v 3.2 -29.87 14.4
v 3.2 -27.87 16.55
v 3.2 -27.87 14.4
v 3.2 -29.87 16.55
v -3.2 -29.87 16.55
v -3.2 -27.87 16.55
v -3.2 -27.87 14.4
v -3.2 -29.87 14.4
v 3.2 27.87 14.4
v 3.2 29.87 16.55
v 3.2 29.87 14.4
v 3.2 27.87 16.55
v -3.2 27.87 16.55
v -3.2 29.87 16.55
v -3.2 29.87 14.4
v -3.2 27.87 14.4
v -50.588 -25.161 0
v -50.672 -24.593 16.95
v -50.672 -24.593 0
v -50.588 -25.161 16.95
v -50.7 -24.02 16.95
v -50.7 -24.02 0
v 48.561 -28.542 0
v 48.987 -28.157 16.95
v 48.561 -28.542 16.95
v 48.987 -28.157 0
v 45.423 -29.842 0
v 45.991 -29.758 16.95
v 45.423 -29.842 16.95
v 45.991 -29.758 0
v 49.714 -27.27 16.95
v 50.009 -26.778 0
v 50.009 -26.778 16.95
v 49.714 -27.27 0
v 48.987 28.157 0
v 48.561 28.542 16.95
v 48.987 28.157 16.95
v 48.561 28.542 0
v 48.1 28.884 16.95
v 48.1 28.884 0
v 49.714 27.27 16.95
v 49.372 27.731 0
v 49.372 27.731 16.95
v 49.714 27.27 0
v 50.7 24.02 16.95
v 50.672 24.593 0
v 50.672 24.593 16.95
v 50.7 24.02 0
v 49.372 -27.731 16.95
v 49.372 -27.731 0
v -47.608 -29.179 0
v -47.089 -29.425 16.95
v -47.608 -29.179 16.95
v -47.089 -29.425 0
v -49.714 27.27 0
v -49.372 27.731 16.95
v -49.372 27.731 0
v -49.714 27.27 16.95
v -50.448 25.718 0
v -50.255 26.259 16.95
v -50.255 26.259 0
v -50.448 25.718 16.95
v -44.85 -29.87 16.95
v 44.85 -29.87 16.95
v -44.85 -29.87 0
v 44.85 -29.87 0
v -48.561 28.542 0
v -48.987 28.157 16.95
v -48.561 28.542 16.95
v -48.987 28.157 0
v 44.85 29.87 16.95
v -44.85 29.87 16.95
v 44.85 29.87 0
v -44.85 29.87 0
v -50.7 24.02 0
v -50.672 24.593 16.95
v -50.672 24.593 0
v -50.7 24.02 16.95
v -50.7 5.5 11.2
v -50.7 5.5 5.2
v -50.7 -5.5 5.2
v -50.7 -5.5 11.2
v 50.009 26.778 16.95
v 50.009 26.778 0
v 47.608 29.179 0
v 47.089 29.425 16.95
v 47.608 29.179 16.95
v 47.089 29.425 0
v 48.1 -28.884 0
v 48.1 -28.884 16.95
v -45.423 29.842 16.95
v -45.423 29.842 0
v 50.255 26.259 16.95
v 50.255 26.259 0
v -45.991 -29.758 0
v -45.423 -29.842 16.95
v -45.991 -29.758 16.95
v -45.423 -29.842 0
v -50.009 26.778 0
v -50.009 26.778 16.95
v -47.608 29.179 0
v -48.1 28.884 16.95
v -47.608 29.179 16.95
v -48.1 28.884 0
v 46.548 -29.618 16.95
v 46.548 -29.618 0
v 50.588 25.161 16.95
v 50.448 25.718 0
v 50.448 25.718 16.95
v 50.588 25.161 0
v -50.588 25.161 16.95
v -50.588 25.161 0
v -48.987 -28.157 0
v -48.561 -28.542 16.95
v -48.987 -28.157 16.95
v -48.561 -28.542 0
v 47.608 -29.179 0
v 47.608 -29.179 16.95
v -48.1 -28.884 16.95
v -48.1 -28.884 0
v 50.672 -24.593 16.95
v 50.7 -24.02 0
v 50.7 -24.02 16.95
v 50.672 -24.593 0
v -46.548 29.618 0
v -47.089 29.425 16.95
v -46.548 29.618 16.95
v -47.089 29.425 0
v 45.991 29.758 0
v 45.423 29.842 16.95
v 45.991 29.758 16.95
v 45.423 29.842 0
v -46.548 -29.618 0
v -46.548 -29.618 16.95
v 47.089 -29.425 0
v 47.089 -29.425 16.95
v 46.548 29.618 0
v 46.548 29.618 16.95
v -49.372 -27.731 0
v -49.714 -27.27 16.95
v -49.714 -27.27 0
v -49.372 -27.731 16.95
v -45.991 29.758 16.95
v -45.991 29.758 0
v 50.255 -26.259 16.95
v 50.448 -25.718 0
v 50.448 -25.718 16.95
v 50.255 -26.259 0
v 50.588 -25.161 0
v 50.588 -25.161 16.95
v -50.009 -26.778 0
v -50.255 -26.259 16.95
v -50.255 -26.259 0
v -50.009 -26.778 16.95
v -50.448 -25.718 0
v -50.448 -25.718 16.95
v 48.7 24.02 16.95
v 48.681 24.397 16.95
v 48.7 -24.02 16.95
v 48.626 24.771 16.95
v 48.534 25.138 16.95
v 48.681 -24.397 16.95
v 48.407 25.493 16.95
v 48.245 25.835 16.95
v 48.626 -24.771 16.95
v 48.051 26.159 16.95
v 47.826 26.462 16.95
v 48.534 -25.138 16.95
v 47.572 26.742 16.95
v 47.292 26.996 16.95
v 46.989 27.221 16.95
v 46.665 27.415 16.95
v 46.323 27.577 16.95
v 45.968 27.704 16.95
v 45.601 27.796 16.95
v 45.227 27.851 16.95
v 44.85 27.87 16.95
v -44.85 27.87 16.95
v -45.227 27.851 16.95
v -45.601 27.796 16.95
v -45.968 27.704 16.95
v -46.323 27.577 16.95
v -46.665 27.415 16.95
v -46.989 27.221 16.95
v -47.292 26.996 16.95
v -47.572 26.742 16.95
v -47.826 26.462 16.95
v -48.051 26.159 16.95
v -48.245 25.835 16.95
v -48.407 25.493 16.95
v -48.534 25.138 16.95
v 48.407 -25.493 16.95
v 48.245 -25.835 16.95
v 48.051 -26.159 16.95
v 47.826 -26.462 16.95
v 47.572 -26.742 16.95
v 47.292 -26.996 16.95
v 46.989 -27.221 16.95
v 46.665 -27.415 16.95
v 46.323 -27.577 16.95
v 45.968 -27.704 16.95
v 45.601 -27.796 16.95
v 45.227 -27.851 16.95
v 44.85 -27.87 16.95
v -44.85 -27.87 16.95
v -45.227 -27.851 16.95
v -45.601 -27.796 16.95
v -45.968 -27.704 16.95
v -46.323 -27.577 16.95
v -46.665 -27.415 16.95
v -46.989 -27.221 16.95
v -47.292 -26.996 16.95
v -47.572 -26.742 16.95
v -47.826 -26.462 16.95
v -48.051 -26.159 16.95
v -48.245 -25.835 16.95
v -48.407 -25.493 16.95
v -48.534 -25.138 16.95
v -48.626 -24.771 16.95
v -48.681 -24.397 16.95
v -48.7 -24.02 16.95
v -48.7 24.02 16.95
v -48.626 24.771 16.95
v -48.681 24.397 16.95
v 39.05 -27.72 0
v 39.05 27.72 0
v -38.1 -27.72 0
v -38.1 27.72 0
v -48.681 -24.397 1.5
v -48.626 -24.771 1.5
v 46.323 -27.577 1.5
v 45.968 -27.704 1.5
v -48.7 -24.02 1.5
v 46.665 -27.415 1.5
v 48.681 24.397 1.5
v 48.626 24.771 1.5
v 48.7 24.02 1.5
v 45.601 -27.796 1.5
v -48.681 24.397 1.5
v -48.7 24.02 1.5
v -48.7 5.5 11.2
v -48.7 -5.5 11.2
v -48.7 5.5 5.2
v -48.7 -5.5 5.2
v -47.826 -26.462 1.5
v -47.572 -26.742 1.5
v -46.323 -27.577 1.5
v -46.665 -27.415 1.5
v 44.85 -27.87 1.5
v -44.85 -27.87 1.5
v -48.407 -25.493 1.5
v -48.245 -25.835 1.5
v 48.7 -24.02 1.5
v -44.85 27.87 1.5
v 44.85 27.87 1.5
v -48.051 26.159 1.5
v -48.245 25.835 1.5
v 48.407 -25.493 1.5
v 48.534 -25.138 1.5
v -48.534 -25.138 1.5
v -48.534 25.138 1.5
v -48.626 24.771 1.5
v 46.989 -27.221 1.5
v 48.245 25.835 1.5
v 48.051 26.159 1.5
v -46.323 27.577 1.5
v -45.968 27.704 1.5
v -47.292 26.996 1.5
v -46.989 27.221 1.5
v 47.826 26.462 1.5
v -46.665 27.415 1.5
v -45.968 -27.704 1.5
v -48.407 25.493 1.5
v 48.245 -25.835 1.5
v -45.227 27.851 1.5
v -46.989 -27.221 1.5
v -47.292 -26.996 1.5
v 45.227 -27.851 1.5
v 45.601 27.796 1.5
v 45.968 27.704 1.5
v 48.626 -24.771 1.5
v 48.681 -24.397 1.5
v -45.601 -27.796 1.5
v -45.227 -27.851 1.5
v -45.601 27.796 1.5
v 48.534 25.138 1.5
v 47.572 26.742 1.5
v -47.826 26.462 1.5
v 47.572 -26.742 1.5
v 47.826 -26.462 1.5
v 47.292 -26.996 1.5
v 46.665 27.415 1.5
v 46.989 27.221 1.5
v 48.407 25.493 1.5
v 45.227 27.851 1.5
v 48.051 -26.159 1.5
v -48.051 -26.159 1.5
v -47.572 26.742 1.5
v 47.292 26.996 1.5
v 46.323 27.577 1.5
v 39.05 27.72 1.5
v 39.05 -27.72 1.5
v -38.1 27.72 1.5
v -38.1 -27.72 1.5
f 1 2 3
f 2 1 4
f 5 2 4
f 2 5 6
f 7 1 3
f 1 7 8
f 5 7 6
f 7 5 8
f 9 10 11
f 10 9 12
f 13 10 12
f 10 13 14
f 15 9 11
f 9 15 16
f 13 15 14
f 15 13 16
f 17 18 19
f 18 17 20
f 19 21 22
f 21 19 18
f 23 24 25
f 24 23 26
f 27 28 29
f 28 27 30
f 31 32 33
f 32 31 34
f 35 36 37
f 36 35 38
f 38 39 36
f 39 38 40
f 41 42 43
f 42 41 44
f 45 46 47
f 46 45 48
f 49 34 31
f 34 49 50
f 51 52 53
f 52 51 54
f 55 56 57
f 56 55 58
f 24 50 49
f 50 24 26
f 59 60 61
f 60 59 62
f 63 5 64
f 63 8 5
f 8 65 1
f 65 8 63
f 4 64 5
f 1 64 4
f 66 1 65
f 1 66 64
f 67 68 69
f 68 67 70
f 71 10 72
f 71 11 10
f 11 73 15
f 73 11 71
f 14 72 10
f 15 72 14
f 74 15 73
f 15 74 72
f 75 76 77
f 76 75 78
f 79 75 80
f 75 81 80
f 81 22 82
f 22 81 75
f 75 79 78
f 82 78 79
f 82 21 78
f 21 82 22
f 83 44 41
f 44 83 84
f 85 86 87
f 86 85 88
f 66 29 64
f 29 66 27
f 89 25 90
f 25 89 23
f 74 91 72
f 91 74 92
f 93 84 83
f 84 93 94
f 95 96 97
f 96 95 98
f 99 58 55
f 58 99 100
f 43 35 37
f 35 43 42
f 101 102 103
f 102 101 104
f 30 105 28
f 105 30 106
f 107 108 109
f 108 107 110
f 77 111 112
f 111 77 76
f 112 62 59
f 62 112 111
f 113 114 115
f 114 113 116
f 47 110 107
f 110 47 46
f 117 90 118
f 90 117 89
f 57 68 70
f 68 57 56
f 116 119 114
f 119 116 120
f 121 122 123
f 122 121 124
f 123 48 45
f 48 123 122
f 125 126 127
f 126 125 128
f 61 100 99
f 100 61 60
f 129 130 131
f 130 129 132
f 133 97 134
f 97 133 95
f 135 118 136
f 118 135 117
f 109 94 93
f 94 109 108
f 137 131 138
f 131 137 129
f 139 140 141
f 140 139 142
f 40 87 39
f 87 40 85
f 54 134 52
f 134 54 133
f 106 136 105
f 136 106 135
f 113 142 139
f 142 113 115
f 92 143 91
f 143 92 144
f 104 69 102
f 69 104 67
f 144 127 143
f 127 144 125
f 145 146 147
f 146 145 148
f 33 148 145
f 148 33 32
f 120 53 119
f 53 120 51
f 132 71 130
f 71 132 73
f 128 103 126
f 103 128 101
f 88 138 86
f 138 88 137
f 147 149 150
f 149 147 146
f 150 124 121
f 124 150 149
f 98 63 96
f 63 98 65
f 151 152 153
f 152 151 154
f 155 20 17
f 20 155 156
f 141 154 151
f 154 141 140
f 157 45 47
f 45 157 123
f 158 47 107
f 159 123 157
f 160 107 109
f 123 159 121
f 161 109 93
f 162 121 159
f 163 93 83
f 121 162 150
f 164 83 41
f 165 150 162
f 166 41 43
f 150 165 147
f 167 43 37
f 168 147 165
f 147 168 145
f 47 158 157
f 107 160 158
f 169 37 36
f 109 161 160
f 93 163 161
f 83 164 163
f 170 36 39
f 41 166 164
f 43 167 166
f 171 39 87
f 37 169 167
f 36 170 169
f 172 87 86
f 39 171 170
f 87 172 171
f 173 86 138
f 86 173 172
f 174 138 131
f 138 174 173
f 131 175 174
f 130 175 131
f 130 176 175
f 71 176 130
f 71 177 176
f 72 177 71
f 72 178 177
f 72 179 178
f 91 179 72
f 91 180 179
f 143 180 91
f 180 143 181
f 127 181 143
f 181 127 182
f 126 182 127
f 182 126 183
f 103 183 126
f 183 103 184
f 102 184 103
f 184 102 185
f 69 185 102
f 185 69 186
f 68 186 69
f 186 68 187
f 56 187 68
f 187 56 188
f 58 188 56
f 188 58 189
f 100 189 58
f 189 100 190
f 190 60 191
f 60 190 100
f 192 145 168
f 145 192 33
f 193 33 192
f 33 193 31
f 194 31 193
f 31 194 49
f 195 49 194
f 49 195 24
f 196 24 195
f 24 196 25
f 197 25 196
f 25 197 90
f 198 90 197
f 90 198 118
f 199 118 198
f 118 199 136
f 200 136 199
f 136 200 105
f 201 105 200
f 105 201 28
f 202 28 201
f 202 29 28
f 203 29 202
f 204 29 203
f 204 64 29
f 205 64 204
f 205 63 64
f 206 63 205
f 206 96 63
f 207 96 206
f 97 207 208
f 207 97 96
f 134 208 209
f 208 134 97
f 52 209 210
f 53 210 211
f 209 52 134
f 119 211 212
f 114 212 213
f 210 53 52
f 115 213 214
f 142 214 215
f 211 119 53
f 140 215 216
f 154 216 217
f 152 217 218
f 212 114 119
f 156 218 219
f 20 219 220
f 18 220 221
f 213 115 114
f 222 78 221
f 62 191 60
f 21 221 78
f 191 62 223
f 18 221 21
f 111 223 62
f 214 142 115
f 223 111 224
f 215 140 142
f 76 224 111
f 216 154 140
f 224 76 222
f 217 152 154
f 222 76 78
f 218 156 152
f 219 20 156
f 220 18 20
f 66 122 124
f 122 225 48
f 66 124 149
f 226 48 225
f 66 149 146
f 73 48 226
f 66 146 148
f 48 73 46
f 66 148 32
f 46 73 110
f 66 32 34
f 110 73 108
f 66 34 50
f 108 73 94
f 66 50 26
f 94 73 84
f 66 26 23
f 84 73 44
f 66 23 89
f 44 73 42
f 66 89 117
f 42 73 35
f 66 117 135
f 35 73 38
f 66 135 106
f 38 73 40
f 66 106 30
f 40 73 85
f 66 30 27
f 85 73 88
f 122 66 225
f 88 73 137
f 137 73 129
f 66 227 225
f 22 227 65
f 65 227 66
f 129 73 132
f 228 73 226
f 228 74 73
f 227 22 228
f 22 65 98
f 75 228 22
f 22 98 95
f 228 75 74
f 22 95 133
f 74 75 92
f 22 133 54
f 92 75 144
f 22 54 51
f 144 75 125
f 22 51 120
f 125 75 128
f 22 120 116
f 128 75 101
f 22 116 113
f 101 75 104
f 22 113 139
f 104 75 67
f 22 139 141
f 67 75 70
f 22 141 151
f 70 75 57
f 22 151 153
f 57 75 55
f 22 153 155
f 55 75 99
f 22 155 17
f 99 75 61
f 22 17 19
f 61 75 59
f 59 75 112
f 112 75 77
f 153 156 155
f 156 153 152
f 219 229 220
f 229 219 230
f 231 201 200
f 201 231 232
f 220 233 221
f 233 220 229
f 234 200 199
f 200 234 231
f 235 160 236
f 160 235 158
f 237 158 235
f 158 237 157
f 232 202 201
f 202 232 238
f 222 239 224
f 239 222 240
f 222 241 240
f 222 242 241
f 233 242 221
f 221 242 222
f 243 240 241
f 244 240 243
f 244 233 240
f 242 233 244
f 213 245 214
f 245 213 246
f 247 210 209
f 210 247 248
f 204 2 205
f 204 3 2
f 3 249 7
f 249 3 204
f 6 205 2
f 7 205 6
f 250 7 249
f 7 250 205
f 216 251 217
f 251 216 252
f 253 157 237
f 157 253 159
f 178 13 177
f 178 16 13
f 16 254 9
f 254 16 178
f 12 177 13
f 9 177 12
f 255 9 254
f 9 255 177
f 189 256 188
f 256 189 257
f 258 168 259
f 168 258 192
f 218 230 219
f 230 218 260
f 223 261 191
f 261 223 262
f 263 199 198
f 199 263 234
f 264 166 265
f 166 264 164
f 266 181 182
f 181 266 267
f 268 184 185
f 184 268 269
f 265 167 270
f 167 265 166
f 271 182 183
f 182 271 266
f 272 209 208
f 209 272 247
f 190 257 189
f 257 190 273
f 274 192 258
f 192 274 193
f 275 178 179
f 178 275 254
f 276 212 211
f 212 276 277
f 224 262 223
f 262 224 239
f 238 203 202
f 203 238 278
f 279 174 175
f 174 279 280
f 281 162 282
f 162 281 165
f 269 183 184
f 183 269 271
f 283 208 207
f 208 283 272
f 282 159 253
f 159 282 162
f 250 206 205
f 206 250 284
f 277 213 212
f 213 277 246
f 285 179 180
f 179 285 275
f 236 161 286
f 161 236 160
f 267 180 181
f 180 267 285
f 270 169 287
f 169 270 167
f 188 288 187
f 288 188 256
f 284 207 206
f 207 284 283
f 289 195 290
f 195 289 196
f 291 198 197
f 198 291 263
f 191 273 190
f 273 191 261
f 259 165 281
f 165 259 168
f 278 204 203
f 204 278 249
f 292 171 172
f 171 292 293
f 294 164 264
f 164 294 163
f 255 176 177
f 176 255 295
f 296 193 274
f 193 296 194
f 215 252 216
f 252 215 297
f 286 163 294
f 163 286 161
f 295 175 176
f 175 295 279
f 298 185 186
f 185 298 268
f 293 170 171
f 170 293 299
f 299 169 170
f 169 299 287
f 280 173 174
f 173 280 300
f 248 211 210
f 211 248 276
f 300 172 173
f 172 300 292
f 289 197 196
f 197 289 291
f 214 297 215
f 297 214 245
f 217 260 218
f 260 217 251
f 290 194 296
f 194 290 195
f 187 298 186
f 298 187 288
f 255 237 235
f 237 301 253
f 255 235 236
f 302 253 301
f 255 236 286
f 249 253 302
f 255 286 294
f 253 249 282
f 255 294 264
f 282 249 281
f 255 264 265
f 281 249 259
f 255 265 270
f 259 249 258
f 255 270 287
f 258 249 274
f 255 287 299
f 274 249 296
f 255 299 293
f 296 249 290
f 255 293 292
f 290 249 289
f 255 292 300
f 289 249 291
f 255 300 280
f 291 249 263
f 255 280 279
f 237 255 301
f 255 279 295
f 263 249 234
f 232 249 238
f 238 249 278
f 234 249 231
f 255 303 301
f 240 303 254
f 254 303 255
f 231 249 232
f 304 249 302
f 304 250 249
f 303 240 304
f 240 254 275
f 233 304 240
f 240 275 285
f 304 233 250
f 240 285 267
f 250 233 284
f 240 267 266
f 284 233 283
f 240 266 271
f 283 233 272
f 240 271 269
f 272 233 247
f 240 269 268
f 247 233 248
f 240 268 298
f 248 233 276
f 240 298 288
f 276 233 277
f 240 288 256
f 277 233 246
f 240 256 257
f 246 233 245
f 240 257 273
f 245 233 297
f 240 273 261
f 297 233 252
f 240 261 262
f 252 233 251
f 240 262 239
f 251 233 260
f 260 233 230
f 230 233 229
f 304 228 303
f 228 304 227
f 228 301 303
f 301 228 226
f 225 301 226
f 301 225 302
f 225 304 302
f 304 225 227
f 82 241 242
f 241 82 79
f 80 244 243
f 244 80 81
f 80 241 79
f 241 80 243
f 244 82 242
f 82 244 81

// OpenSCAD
// ============================================================
// Claude Monitor enclosure — LCDWIKI E32R32P (3.2" ESP32-32E CYD)
// + Akyga LP405090 LiPo battery
//
// Two printable parts, selected by the PART variable at the
// bottom of this file: "body" and "lid". Render/export each
// separately (F6 -> Export as STL in OpenSCAD, or the CLI calls
// used to generate cad/stl/*.stl).
//
// Board dimensions are from LCDWIKI's
// E32R32P_E32N32P_Specification_V1.0.pdf, sections 3.2/3.4/4.1/5.1.
// Battery dimensions are user-measured (Akyga LP405090).
// Everything is a variable — re-measure your actual hardware and
// tweak the numbers below before printing if anything doesn't
// match.
// ============================================================

/* [Board — datasheet sec 5.1 / 3.4, landscape orientation (long
   edge horizontal), matching this project's default rotation 3.
   Hole spacing cross-checked against LCDWIKI's E32N32P_Size.pdf
   (same PCB, no-touch sibling SKU, clearer print of the same
   drawing) — that copy states the short-axis hole spacing in
   plain text as "48.00(HOLE)", not the 54.64 originally used here
   (54.64 was actually "(RTP OD)", a touch-panel outline dimension
   misread off the busier E32R32P sheet). ] */
pcb_l        = 93.70;  // PCB long-edge length          (sec 5.1 "93.70(PCB)")
pcb_w        = 55.04;  // PCB short-edge width           (sec 5.1 "55.04(PCB)")
pcb_corner_r = 3.50;   // PCB corner radius              (sec 5.1 "4-R3.50")
// hole_l/hole_w/hole_d: reference only, not used by any geometry below — this
// design has no corner standoffs/screws (see the note near case_body() for
// why), so these just document the real hardware for whoever revisits this.
hole_l       = 86.70;  // mounting-hole pattern, long axis  (sec 5.1 "86.70(HOLE)")
hole_w       = 48.00;  // mounting-hole pattern, short axis (E32N32P_Size.pdf "48.00(HOLE)")
hole_d       = 3.50;   // mounting hole diameter          (sec 5.1 "4-Ø3.20")
stack_d      = 5.70;   // PCB-back-to-glass-front stack depth (sec 3.4 "Module...5.70(D)")
pcb_thick    = 1.60;   // bare PCB thickness (stack breakdown 1.60+1.20+2.40+0.50=5.70)
back_comp_h  = 2.00;   // tallest back-side SMD component height (sec 5.1 side view "5.09 Max(SMD)")

/* [Screen window — sec 3.2/5.1]
   Sized to the LCD BACKLIGHT/glass MODULE footprint (77.70 x 55.04, per
   E32N32P_Size.pdf) on BOTH axes, not the smaller active-pixel area
   (64.80 x 48.60). The module is centered on the PCB in the long axis
   (93.70-77.70=16.00, i.e. exactly 8.00mm margin both ends — matches that
   drawing's separately-printed "8.00" label); in the short axis the module
   (55.04) is exactly pcb_w — flush edge-to-edge, zero margin on the PCB
   itself. This still leaves a real bezel because the front wall is solid
   out to the case's OUTER edge (out_w), not just the cavity edge (in_w) —
   with screen_reveal_extra=0.2 the window ends up ~2.15mm inside out_w,
   plenty for a clean frame. Either way, the smaller active area nests
   entirely inside the module footprint on both axes, so every active pixel
   is still fully exposed. The active area itself is NOT centered within the
   module on the long axis (11.50mm from one end, 17.40mm from the other,
   because of the FPC tail) — but that only matters if you want the window
   to hug the pixels tightly; using the module size instead sidesteps that
   asymmetry entirely. */
screen_w            = 76.75; // LCD BL (glass module), long axis  ("77.70±0.2(LCD BL)")
screen_h            = 55.04; // LCD BL (glass module), short axis — equals pcb_w exactly
screen_r_margin     = 8.00;  // module offset from PCB edge, symmetric both ends
screen_reveal_extra = 0.2;   // extra reveal so the bezel doesn't clip the glass edge

// IMPORTANT: with the corrected hole_w=48.00, the mounting-hole centers
// (±24.00mm) fall *inside* the screen active area's own half-height
// (±24.30mm) — the datasheet's own numbers give the screw holes essentially
// zero (or negative, once ±0.2 tolerance is considered) clearance from the
// visible glass. There is no boss diameter, however small, that avoids the
// window at that exact position — see standoffs() below for how this is
// actually handled (short answer: it isn't a mounting point on this design).

/* [USB-C cutout — sec 4.1 interface photo: Type-C sits on the
   LEFT short edge, vertically centered (derived from sec 5.1's
   13.92/13.60/13.92 left-edge spacing, which sums symmetrically
   around pcb_w/2). The connector is mounted on the PCB's BACK
   (component) side, i.e. it only exists at z >= z_pcb_back and
   extends further in (larger z) from there — usbc_z0 must be >= 0.
   A previous value of -1 put the cutout 1mm in front of z_pcb_back,
   inside the LCD-module/PCB stack itself, which is too close to the
   screen side. Height is still an estimate — verify against your
   physical board and adjust if it's off. ] */
usbc_w  = 11.0;
usbc_h  = 6.0;
usbc_z0 = -2;    // offset added to z_pcb_back (see derived section) — must be >= 0

/* [Battery — Akyga LP405090, user-measured] */
batt_l = 94;
batt_w = 50;
batt_t = 3.0;

/* [Fit & print tuning] */
clearance    = 0.35; // per-side gap around the PCB inside its cavity (XY footprint only —
                      // see batt_z_slack below for the battery's own, separate tolerance)
wall         = 2.0;  // structural wall thickness
front_wall   = 1.5;  // front bezel thickness (thinner: it's mostly cut away by the screen window)
skirt_h      = 2.1;  // lid skirt engagement depth into the case body. A 2mm overall depth cut
                      // was needed; the first attempt took the whole 2mm out of skirt_h alone
                      // (3.5->1.5), which is the wrong place — it's the one thing that actually
                      // holds the lid on. Rebalanced: most of the cut now comes out of slack
                      // that wasn't doing much (see the shrunk comp-to-battery gap and
                      // batt_z_slack below, plus the final case_h margin), so skirt_h only
                      // drops to 2.1 instead of 1.5 — tab thickness (skirt_h*0.5) is 1.05mm
                      // instead of 0.75mm for the same total case_h.
fit_gap      = 0.25; // skirt-to-cavity clearance (loosen if the lid is too tight on your printer)
lid_thick    = 2.0;  // lid back-plate thickness
tab_w        = 6;    // snap-tab width
tab_reach    = 0.8;  // how far the snap tab bump projects past the skirt face
batt_z_slack = 0.2;   // battery-bay depth tolerance — deliberately a separate variable from
                      // `clearance` above: they used to be the same value reused for two
                      // unrelated things, so tightening the PCB's XY fit would have silently
                      // made the case_h computation change too (via z_batt_back). Trimmed from
                      // 0.35 to 0.2 as part of the depth-reduction rebalance (see skirt_h).
batt_l_extra = 3.0;   // extra cavity length (X axis) beyond what the PCB itself needs, purely
                      // to give the battery bay room — at batt_l=94 vs the PCB-driven in_l
                      // (~94.4 with just `clearance`), there was only ~0.4mm to spare, not
                      // enough to actually place the battery + its connector/wire.
                      // NOT added to in_w: batt_w=50 already clears in_w comfortably.
                      // Note this widens the case uniformly front-to-back (same cross-section
                      // the whole depth), so the front bezel ends up with ~1.5mm more margin
                      // on each end too — cosmetic only, doesn't touch the screen window math
                      // below (that's still centered on pcb_l, not in_l).
$fn = 64;

// ---- derived (don't hand-edit these — they follow from the above) ----
in_l  = pcb_l + 2*clearance + batt_l_extra;
in_w  = pcb_w + 2*clearance;
in_r  = pcb_corner_r + clearance;

out_l = in_l + 2*wall;
out_w = in_w + 2*wall;
out_r = in_r + wall;

lcd_module_gap = stack_d - pcb_thick;          // LCD module footprint in front of the PCB (RTP+glass+tape)
z_pcb_front  = front_wall + lcd_module_gap;    // PCB front (copper/RTP side) surface — flush LCD glass sits right at the front wall
z_pcb_back   = z_pcb_front + pcb_thick;        // PCB back (component) surface
z_comp_tip   = z_pcb_back + back_comp_h;       // tallest back-side component tip
z_batt_front = z_comp_tip + 0.3;               // clearance gap before battery bay (trimmed from
                                                // 0.6 as part of the depth-reduction rebalance)
z_batt_back  = z_batt_front + batt_t + batt_z_slack;

// The lid, once seated, has its back plate (lid_thick) flush with the case's
// back rim, and the skirt extends FORWARD from there — so the skirt's tip
// (its shallowest reach into the cavity) lands at case_h - lid_thick - skirt_h,
// not case_h - skirt_h. A previous version of this formula omitted lid_thick
// entirely, undersizing case_h by exactly 2mm (lid_thick's value) — verified
// by actually nesting the lid into the case and intersecting it against a
// modeled battery volume (not just re-checking the formula against itself,
// which is how the bug went unnoticed for several edits): that test produced
// real overlap geometry, confirming an ~1.85mm physical collision that the
// old formula's own "0.15mm clearance" claim had completely missed.
case_h       = z_batt_back + lid_thick + skirt_h + 0.15; // total case-body height (excludes lid)
cavity_depth = case_h - front_wall;            // front-wall inner face -> open back rim

// batt_l/batt_w otherwise have no effect on the geometry at all (the cavity's
// XY footprint is sized purely from the PCB) — nothing previously caught a
// battery that's too big for it, so a future edit to clearance/pcb_l/pcb_w
// could silently make the battery not fit. This just makes that loud instead.
assert(batt_l <= in_l - 0.2,
    str("battery (batt_l=", batt_l, ") doesn't fit the cavity length (in_l=", in_l, ")"));
assert(batt_w <= in_w - 0.2,
    str("battery (batt_w=", batt_w, ") doesn't fit the cavity width (in_w=", in_w, ")"));

echo(str("Case body exterior: ", out_l, " x ", out_w, " x ", case_h, " mm"));
echo(str("Cavity depth (behind front wall): ", cavity_depth, " mm"));
echo(str("Lid overall thickness (plate+skirt beyond case rim): ", lid_thick, " mm"));

module rrect(l, w, r) {
    hull() {
        for (x = [-1, 1], y = [-1, 1])
            translate([x*(l/2 - r), y*(w/2 - r)]) circle(r = r);
    }
}

module screen_window() {
    win_w = screen_w + 2*screen_reveal_extra;
    win_h = screen_h + 2*screen_reveal_extra;
    // active area sits screen_r_margin from the PCB's right edge (the FPC/
    // pull-tape edge, opposite the USB-C wall at x=-out_l/2); x_off is how
    // far the window center sits right of the PCB/case center, toward that
    // near edge.
    x_off = (pcb_l - screen_w)/2 - screen_r_margin;
    translate([x_off, 0, -1])
        linear_extrude(height = front_wall + 2)
            square([win_w, win_h], center = true);
}

module usbc_window() {
    z0 = z_pcb_back + usbc_z0;
    translate([-out_l/2 - 1, -usbc_w/2, z0])
        cube([wall + 2, usbc_w, usbc_h]);
}

// No corner screws/standoffs on this design — deliberately. A front-wall
// standoff at the real hole_l x hole_w positions is not possible without
// poking into the screen window (see the note above pcb_l/pcb_w). On the
// real board this corner is covered by the LCD module's own opaque frame
// (the "LCD BL" backlight outline is exactly pcb_w wide, i.e. it already
// spans corner-to-corner), not by anything the case contributes — so the
// case has nothing to attach a standoff to there without visibly
// overlapping the cutout.
//
// Retention instead relies on a snug friction-fit stack: front wall <-
// LCD module <- PCB <- back-side components <- battery <- lid, each
// dimensioned with only small (0.2-0.6mm) clearances (see the z_* derived
// values below), so the closed lid holds the whole assembly firmly against
// the front wall. If it ever feels loose, a small dot of foam tape behind
// the battery is the simple fix — don't add screws back in at hole_l/hole_w
// without re-deriving the math above; it doesn't fit.

module snap_slots() {
    // rectangular slots cut into the inside of the long sidewalls near the back rim,
    // matched by protruding tabs on the lid skirt (see lid()).
    //
    // This MUST be a fully enclosed pocket, not a cut that reaches the case's own
    // back edge — a previous version sized this as case_h-skirt_h/2 +/- (slot_h+0.4)/2,
    // which put the slot's outer edge at 20.29 while case_h was only 20.04: the slot
    // was open straight through to the case's own rim, with solid material in front of
    // the tab's resting position (stopping over-insertion) but NONE behind it. Nothing
    // then stopped the lid from just being lifted straight back off — a snap-fit needs
    // material on BOTH sides of the tab once seated, not just one.
    //
    // slot_roof reserves real case material above the pocket for the tab to hook
    // behind; slot_h only needs to comfortably contain the tab's own thickness
    // (skirt_h*0.5, must match lid()'s tab) plus a little insertion slack — it does
    // NOT need to reach anywhere near case_h.
    slot_roof   = 0.4;
    tab_h       = skirt_h * 0.5;             // must match the tab's thickness in lid()
    tab_center  = case_h - skirt_h/2;        // must match the tab's global z position in lid()
    slot_h      = tab_h + 1.1;               // tab thickness + insertion slack; bumped from +0.6
                                              // to +1.1 (extra 0.5mm) for easier engagement —
                                              // tab and slot were both landing around ~1mm thick,
                                              // too snug to reliably slide together
    slot_d      = wall + 1;
    slot_top    = min(tab_center + slot_h/2, case_h - slot_roof);
    z0          = slot_top - slot_h/2;
    assert(z0 - slot_h/2 <= tab_center - tab_h/2,
        "snap_slots: pocket doesn't fully contain the tab's insertion range");
    for (y = [-1, 1])
        translate([0, y*(in_w/2 + wall/2), z0])
            cube([tab_w + 0.4, slot_d, slot_h], center = true);
}

module case_body() {
    difference() {
        linear_extrude(height = case_h) rrect(out_l, out_w, out_r);
        translate([0, 0, front_wall])
            linear_extrude(height = cavity_depth + 1) rrect(in_l, in_w, in_r);
        screen_window();
        usbc_window();
        snap_slots();
    }
}

// Cantilever relief: a plain cube tab fused directly to the skirt's rigid
// wall has nothing to flex — the whole skirt would have to deform, which a
// ~2mm FDM wall won't do reliably. These cuts free a short flexible finger
// on either side of each tab so the tab itself can deflect on insertion.
tab_finger_w  = tab_w + 4;   // finger is wider than the tab so the tab sits on solid material
tab_relief_w  = 1.2;         // width of the flex-relief slot cut beside each finger
tab_relief_h  = skirt_h + 1; // spans slightly more than the full skirt height to cut cleanly through
tab_relief_overlap = 0.1;    // the finger's edge and the relief cut's inner edge would otherwise
                              // land at the exact same X coordinate (an exact tangency, not a
                              // guaranteed overlap) — this nudges the cut slightly into the
                              // finger so the boundary isn't a degenerate zero-thickness seam

module lid() {
    skirt_od_l  = in_l - 2*fit_gap;
    skirt_od_w  = in_w - 2*fit_gap;
    skirt_r     = max(in_r - fit_gap, 0.5);
    skirt_wall  = wall; // match the case's own wall thickness

    difference() {
        union() {
            // back plate, sized to the case's outer footprint so it caps the open back flush
            linear_extrude(height = lid_thick) rrect(out_l, out_w, out_r);

            // thin-walled skirt shell that plugs into the case cavity — NOT solid: a solid
            // plug this deep (skirt_h) would occupy the same space as the battery bay
            translate([0, 0, lid_thick])
                linear_extrude(height = skirt_h)
                    difference() {
                        rrect(skirt_od_l, skirt_od_w, skirt_r);
                        rrect(skirt_od_l - 2*skirt_wall, skirt_od_w - 2*skirt_wall,
                              max(skirt_r - skirt_wall, 0.5));
                    }

            // snap tabs on the two long sides of the skirt
            for (y = [-1, 1])
                translate([0, y*(skirt_od_w/2), lid_thick + skirt_h/2])
                    cube([tab_w, tab_reach*2, skirt_h*0.5], center = true);
        }

        // free-flex the tabs from the rest of the skirt wall
        for (y = [-1, 1], xs = [-1, 1])
            translate([xs*(tab_finger_w/2 + tab_relief_w/2 - tab_relief_overlap), y*(skirt_od_w/2), lid_thick + tab_relief_h/2])
                cube([tab_relief_w, wall*3, tab_relief_h], center = true);
    }
}

// ============================================================
// Select what to render/export. Change to "lid" and re-render to
// get the second STL.
// ============================================================
// Places the lid in its true seated position: back plate flush with the
// case's back rim (global z=case_h), skirt/tabs projecting forward into the
// cavity. Useful for actually verifying (or just seeing) how the snap tabs
// engage the case's slots — the two live on separate STL files, so neither
// one alone ever shows the complete retention mechanism.
module lid_seated() {
    translate([0, 0, case_h])
        mirror([0, 0, 1])
            lid();
}

PART = "body"; // "body" | "lid" | "preview" (side by side) | "assembled" (nested, as installed)
                // | "none" (render nothing — lets another file `include` this one, e.g. for a
                // cutaway/collision check, without this file's own tail adding stray geometry)

if (PART == "body") case_body();
else if (PART == "lid") lid();
else if (PART == "assembled") {
    case_body();
    color("orange") lid_seated();
}
else if (PART == "none") { }
else {
    case_body();
    translate([0, out_w + 10, 0]) lid();
}
